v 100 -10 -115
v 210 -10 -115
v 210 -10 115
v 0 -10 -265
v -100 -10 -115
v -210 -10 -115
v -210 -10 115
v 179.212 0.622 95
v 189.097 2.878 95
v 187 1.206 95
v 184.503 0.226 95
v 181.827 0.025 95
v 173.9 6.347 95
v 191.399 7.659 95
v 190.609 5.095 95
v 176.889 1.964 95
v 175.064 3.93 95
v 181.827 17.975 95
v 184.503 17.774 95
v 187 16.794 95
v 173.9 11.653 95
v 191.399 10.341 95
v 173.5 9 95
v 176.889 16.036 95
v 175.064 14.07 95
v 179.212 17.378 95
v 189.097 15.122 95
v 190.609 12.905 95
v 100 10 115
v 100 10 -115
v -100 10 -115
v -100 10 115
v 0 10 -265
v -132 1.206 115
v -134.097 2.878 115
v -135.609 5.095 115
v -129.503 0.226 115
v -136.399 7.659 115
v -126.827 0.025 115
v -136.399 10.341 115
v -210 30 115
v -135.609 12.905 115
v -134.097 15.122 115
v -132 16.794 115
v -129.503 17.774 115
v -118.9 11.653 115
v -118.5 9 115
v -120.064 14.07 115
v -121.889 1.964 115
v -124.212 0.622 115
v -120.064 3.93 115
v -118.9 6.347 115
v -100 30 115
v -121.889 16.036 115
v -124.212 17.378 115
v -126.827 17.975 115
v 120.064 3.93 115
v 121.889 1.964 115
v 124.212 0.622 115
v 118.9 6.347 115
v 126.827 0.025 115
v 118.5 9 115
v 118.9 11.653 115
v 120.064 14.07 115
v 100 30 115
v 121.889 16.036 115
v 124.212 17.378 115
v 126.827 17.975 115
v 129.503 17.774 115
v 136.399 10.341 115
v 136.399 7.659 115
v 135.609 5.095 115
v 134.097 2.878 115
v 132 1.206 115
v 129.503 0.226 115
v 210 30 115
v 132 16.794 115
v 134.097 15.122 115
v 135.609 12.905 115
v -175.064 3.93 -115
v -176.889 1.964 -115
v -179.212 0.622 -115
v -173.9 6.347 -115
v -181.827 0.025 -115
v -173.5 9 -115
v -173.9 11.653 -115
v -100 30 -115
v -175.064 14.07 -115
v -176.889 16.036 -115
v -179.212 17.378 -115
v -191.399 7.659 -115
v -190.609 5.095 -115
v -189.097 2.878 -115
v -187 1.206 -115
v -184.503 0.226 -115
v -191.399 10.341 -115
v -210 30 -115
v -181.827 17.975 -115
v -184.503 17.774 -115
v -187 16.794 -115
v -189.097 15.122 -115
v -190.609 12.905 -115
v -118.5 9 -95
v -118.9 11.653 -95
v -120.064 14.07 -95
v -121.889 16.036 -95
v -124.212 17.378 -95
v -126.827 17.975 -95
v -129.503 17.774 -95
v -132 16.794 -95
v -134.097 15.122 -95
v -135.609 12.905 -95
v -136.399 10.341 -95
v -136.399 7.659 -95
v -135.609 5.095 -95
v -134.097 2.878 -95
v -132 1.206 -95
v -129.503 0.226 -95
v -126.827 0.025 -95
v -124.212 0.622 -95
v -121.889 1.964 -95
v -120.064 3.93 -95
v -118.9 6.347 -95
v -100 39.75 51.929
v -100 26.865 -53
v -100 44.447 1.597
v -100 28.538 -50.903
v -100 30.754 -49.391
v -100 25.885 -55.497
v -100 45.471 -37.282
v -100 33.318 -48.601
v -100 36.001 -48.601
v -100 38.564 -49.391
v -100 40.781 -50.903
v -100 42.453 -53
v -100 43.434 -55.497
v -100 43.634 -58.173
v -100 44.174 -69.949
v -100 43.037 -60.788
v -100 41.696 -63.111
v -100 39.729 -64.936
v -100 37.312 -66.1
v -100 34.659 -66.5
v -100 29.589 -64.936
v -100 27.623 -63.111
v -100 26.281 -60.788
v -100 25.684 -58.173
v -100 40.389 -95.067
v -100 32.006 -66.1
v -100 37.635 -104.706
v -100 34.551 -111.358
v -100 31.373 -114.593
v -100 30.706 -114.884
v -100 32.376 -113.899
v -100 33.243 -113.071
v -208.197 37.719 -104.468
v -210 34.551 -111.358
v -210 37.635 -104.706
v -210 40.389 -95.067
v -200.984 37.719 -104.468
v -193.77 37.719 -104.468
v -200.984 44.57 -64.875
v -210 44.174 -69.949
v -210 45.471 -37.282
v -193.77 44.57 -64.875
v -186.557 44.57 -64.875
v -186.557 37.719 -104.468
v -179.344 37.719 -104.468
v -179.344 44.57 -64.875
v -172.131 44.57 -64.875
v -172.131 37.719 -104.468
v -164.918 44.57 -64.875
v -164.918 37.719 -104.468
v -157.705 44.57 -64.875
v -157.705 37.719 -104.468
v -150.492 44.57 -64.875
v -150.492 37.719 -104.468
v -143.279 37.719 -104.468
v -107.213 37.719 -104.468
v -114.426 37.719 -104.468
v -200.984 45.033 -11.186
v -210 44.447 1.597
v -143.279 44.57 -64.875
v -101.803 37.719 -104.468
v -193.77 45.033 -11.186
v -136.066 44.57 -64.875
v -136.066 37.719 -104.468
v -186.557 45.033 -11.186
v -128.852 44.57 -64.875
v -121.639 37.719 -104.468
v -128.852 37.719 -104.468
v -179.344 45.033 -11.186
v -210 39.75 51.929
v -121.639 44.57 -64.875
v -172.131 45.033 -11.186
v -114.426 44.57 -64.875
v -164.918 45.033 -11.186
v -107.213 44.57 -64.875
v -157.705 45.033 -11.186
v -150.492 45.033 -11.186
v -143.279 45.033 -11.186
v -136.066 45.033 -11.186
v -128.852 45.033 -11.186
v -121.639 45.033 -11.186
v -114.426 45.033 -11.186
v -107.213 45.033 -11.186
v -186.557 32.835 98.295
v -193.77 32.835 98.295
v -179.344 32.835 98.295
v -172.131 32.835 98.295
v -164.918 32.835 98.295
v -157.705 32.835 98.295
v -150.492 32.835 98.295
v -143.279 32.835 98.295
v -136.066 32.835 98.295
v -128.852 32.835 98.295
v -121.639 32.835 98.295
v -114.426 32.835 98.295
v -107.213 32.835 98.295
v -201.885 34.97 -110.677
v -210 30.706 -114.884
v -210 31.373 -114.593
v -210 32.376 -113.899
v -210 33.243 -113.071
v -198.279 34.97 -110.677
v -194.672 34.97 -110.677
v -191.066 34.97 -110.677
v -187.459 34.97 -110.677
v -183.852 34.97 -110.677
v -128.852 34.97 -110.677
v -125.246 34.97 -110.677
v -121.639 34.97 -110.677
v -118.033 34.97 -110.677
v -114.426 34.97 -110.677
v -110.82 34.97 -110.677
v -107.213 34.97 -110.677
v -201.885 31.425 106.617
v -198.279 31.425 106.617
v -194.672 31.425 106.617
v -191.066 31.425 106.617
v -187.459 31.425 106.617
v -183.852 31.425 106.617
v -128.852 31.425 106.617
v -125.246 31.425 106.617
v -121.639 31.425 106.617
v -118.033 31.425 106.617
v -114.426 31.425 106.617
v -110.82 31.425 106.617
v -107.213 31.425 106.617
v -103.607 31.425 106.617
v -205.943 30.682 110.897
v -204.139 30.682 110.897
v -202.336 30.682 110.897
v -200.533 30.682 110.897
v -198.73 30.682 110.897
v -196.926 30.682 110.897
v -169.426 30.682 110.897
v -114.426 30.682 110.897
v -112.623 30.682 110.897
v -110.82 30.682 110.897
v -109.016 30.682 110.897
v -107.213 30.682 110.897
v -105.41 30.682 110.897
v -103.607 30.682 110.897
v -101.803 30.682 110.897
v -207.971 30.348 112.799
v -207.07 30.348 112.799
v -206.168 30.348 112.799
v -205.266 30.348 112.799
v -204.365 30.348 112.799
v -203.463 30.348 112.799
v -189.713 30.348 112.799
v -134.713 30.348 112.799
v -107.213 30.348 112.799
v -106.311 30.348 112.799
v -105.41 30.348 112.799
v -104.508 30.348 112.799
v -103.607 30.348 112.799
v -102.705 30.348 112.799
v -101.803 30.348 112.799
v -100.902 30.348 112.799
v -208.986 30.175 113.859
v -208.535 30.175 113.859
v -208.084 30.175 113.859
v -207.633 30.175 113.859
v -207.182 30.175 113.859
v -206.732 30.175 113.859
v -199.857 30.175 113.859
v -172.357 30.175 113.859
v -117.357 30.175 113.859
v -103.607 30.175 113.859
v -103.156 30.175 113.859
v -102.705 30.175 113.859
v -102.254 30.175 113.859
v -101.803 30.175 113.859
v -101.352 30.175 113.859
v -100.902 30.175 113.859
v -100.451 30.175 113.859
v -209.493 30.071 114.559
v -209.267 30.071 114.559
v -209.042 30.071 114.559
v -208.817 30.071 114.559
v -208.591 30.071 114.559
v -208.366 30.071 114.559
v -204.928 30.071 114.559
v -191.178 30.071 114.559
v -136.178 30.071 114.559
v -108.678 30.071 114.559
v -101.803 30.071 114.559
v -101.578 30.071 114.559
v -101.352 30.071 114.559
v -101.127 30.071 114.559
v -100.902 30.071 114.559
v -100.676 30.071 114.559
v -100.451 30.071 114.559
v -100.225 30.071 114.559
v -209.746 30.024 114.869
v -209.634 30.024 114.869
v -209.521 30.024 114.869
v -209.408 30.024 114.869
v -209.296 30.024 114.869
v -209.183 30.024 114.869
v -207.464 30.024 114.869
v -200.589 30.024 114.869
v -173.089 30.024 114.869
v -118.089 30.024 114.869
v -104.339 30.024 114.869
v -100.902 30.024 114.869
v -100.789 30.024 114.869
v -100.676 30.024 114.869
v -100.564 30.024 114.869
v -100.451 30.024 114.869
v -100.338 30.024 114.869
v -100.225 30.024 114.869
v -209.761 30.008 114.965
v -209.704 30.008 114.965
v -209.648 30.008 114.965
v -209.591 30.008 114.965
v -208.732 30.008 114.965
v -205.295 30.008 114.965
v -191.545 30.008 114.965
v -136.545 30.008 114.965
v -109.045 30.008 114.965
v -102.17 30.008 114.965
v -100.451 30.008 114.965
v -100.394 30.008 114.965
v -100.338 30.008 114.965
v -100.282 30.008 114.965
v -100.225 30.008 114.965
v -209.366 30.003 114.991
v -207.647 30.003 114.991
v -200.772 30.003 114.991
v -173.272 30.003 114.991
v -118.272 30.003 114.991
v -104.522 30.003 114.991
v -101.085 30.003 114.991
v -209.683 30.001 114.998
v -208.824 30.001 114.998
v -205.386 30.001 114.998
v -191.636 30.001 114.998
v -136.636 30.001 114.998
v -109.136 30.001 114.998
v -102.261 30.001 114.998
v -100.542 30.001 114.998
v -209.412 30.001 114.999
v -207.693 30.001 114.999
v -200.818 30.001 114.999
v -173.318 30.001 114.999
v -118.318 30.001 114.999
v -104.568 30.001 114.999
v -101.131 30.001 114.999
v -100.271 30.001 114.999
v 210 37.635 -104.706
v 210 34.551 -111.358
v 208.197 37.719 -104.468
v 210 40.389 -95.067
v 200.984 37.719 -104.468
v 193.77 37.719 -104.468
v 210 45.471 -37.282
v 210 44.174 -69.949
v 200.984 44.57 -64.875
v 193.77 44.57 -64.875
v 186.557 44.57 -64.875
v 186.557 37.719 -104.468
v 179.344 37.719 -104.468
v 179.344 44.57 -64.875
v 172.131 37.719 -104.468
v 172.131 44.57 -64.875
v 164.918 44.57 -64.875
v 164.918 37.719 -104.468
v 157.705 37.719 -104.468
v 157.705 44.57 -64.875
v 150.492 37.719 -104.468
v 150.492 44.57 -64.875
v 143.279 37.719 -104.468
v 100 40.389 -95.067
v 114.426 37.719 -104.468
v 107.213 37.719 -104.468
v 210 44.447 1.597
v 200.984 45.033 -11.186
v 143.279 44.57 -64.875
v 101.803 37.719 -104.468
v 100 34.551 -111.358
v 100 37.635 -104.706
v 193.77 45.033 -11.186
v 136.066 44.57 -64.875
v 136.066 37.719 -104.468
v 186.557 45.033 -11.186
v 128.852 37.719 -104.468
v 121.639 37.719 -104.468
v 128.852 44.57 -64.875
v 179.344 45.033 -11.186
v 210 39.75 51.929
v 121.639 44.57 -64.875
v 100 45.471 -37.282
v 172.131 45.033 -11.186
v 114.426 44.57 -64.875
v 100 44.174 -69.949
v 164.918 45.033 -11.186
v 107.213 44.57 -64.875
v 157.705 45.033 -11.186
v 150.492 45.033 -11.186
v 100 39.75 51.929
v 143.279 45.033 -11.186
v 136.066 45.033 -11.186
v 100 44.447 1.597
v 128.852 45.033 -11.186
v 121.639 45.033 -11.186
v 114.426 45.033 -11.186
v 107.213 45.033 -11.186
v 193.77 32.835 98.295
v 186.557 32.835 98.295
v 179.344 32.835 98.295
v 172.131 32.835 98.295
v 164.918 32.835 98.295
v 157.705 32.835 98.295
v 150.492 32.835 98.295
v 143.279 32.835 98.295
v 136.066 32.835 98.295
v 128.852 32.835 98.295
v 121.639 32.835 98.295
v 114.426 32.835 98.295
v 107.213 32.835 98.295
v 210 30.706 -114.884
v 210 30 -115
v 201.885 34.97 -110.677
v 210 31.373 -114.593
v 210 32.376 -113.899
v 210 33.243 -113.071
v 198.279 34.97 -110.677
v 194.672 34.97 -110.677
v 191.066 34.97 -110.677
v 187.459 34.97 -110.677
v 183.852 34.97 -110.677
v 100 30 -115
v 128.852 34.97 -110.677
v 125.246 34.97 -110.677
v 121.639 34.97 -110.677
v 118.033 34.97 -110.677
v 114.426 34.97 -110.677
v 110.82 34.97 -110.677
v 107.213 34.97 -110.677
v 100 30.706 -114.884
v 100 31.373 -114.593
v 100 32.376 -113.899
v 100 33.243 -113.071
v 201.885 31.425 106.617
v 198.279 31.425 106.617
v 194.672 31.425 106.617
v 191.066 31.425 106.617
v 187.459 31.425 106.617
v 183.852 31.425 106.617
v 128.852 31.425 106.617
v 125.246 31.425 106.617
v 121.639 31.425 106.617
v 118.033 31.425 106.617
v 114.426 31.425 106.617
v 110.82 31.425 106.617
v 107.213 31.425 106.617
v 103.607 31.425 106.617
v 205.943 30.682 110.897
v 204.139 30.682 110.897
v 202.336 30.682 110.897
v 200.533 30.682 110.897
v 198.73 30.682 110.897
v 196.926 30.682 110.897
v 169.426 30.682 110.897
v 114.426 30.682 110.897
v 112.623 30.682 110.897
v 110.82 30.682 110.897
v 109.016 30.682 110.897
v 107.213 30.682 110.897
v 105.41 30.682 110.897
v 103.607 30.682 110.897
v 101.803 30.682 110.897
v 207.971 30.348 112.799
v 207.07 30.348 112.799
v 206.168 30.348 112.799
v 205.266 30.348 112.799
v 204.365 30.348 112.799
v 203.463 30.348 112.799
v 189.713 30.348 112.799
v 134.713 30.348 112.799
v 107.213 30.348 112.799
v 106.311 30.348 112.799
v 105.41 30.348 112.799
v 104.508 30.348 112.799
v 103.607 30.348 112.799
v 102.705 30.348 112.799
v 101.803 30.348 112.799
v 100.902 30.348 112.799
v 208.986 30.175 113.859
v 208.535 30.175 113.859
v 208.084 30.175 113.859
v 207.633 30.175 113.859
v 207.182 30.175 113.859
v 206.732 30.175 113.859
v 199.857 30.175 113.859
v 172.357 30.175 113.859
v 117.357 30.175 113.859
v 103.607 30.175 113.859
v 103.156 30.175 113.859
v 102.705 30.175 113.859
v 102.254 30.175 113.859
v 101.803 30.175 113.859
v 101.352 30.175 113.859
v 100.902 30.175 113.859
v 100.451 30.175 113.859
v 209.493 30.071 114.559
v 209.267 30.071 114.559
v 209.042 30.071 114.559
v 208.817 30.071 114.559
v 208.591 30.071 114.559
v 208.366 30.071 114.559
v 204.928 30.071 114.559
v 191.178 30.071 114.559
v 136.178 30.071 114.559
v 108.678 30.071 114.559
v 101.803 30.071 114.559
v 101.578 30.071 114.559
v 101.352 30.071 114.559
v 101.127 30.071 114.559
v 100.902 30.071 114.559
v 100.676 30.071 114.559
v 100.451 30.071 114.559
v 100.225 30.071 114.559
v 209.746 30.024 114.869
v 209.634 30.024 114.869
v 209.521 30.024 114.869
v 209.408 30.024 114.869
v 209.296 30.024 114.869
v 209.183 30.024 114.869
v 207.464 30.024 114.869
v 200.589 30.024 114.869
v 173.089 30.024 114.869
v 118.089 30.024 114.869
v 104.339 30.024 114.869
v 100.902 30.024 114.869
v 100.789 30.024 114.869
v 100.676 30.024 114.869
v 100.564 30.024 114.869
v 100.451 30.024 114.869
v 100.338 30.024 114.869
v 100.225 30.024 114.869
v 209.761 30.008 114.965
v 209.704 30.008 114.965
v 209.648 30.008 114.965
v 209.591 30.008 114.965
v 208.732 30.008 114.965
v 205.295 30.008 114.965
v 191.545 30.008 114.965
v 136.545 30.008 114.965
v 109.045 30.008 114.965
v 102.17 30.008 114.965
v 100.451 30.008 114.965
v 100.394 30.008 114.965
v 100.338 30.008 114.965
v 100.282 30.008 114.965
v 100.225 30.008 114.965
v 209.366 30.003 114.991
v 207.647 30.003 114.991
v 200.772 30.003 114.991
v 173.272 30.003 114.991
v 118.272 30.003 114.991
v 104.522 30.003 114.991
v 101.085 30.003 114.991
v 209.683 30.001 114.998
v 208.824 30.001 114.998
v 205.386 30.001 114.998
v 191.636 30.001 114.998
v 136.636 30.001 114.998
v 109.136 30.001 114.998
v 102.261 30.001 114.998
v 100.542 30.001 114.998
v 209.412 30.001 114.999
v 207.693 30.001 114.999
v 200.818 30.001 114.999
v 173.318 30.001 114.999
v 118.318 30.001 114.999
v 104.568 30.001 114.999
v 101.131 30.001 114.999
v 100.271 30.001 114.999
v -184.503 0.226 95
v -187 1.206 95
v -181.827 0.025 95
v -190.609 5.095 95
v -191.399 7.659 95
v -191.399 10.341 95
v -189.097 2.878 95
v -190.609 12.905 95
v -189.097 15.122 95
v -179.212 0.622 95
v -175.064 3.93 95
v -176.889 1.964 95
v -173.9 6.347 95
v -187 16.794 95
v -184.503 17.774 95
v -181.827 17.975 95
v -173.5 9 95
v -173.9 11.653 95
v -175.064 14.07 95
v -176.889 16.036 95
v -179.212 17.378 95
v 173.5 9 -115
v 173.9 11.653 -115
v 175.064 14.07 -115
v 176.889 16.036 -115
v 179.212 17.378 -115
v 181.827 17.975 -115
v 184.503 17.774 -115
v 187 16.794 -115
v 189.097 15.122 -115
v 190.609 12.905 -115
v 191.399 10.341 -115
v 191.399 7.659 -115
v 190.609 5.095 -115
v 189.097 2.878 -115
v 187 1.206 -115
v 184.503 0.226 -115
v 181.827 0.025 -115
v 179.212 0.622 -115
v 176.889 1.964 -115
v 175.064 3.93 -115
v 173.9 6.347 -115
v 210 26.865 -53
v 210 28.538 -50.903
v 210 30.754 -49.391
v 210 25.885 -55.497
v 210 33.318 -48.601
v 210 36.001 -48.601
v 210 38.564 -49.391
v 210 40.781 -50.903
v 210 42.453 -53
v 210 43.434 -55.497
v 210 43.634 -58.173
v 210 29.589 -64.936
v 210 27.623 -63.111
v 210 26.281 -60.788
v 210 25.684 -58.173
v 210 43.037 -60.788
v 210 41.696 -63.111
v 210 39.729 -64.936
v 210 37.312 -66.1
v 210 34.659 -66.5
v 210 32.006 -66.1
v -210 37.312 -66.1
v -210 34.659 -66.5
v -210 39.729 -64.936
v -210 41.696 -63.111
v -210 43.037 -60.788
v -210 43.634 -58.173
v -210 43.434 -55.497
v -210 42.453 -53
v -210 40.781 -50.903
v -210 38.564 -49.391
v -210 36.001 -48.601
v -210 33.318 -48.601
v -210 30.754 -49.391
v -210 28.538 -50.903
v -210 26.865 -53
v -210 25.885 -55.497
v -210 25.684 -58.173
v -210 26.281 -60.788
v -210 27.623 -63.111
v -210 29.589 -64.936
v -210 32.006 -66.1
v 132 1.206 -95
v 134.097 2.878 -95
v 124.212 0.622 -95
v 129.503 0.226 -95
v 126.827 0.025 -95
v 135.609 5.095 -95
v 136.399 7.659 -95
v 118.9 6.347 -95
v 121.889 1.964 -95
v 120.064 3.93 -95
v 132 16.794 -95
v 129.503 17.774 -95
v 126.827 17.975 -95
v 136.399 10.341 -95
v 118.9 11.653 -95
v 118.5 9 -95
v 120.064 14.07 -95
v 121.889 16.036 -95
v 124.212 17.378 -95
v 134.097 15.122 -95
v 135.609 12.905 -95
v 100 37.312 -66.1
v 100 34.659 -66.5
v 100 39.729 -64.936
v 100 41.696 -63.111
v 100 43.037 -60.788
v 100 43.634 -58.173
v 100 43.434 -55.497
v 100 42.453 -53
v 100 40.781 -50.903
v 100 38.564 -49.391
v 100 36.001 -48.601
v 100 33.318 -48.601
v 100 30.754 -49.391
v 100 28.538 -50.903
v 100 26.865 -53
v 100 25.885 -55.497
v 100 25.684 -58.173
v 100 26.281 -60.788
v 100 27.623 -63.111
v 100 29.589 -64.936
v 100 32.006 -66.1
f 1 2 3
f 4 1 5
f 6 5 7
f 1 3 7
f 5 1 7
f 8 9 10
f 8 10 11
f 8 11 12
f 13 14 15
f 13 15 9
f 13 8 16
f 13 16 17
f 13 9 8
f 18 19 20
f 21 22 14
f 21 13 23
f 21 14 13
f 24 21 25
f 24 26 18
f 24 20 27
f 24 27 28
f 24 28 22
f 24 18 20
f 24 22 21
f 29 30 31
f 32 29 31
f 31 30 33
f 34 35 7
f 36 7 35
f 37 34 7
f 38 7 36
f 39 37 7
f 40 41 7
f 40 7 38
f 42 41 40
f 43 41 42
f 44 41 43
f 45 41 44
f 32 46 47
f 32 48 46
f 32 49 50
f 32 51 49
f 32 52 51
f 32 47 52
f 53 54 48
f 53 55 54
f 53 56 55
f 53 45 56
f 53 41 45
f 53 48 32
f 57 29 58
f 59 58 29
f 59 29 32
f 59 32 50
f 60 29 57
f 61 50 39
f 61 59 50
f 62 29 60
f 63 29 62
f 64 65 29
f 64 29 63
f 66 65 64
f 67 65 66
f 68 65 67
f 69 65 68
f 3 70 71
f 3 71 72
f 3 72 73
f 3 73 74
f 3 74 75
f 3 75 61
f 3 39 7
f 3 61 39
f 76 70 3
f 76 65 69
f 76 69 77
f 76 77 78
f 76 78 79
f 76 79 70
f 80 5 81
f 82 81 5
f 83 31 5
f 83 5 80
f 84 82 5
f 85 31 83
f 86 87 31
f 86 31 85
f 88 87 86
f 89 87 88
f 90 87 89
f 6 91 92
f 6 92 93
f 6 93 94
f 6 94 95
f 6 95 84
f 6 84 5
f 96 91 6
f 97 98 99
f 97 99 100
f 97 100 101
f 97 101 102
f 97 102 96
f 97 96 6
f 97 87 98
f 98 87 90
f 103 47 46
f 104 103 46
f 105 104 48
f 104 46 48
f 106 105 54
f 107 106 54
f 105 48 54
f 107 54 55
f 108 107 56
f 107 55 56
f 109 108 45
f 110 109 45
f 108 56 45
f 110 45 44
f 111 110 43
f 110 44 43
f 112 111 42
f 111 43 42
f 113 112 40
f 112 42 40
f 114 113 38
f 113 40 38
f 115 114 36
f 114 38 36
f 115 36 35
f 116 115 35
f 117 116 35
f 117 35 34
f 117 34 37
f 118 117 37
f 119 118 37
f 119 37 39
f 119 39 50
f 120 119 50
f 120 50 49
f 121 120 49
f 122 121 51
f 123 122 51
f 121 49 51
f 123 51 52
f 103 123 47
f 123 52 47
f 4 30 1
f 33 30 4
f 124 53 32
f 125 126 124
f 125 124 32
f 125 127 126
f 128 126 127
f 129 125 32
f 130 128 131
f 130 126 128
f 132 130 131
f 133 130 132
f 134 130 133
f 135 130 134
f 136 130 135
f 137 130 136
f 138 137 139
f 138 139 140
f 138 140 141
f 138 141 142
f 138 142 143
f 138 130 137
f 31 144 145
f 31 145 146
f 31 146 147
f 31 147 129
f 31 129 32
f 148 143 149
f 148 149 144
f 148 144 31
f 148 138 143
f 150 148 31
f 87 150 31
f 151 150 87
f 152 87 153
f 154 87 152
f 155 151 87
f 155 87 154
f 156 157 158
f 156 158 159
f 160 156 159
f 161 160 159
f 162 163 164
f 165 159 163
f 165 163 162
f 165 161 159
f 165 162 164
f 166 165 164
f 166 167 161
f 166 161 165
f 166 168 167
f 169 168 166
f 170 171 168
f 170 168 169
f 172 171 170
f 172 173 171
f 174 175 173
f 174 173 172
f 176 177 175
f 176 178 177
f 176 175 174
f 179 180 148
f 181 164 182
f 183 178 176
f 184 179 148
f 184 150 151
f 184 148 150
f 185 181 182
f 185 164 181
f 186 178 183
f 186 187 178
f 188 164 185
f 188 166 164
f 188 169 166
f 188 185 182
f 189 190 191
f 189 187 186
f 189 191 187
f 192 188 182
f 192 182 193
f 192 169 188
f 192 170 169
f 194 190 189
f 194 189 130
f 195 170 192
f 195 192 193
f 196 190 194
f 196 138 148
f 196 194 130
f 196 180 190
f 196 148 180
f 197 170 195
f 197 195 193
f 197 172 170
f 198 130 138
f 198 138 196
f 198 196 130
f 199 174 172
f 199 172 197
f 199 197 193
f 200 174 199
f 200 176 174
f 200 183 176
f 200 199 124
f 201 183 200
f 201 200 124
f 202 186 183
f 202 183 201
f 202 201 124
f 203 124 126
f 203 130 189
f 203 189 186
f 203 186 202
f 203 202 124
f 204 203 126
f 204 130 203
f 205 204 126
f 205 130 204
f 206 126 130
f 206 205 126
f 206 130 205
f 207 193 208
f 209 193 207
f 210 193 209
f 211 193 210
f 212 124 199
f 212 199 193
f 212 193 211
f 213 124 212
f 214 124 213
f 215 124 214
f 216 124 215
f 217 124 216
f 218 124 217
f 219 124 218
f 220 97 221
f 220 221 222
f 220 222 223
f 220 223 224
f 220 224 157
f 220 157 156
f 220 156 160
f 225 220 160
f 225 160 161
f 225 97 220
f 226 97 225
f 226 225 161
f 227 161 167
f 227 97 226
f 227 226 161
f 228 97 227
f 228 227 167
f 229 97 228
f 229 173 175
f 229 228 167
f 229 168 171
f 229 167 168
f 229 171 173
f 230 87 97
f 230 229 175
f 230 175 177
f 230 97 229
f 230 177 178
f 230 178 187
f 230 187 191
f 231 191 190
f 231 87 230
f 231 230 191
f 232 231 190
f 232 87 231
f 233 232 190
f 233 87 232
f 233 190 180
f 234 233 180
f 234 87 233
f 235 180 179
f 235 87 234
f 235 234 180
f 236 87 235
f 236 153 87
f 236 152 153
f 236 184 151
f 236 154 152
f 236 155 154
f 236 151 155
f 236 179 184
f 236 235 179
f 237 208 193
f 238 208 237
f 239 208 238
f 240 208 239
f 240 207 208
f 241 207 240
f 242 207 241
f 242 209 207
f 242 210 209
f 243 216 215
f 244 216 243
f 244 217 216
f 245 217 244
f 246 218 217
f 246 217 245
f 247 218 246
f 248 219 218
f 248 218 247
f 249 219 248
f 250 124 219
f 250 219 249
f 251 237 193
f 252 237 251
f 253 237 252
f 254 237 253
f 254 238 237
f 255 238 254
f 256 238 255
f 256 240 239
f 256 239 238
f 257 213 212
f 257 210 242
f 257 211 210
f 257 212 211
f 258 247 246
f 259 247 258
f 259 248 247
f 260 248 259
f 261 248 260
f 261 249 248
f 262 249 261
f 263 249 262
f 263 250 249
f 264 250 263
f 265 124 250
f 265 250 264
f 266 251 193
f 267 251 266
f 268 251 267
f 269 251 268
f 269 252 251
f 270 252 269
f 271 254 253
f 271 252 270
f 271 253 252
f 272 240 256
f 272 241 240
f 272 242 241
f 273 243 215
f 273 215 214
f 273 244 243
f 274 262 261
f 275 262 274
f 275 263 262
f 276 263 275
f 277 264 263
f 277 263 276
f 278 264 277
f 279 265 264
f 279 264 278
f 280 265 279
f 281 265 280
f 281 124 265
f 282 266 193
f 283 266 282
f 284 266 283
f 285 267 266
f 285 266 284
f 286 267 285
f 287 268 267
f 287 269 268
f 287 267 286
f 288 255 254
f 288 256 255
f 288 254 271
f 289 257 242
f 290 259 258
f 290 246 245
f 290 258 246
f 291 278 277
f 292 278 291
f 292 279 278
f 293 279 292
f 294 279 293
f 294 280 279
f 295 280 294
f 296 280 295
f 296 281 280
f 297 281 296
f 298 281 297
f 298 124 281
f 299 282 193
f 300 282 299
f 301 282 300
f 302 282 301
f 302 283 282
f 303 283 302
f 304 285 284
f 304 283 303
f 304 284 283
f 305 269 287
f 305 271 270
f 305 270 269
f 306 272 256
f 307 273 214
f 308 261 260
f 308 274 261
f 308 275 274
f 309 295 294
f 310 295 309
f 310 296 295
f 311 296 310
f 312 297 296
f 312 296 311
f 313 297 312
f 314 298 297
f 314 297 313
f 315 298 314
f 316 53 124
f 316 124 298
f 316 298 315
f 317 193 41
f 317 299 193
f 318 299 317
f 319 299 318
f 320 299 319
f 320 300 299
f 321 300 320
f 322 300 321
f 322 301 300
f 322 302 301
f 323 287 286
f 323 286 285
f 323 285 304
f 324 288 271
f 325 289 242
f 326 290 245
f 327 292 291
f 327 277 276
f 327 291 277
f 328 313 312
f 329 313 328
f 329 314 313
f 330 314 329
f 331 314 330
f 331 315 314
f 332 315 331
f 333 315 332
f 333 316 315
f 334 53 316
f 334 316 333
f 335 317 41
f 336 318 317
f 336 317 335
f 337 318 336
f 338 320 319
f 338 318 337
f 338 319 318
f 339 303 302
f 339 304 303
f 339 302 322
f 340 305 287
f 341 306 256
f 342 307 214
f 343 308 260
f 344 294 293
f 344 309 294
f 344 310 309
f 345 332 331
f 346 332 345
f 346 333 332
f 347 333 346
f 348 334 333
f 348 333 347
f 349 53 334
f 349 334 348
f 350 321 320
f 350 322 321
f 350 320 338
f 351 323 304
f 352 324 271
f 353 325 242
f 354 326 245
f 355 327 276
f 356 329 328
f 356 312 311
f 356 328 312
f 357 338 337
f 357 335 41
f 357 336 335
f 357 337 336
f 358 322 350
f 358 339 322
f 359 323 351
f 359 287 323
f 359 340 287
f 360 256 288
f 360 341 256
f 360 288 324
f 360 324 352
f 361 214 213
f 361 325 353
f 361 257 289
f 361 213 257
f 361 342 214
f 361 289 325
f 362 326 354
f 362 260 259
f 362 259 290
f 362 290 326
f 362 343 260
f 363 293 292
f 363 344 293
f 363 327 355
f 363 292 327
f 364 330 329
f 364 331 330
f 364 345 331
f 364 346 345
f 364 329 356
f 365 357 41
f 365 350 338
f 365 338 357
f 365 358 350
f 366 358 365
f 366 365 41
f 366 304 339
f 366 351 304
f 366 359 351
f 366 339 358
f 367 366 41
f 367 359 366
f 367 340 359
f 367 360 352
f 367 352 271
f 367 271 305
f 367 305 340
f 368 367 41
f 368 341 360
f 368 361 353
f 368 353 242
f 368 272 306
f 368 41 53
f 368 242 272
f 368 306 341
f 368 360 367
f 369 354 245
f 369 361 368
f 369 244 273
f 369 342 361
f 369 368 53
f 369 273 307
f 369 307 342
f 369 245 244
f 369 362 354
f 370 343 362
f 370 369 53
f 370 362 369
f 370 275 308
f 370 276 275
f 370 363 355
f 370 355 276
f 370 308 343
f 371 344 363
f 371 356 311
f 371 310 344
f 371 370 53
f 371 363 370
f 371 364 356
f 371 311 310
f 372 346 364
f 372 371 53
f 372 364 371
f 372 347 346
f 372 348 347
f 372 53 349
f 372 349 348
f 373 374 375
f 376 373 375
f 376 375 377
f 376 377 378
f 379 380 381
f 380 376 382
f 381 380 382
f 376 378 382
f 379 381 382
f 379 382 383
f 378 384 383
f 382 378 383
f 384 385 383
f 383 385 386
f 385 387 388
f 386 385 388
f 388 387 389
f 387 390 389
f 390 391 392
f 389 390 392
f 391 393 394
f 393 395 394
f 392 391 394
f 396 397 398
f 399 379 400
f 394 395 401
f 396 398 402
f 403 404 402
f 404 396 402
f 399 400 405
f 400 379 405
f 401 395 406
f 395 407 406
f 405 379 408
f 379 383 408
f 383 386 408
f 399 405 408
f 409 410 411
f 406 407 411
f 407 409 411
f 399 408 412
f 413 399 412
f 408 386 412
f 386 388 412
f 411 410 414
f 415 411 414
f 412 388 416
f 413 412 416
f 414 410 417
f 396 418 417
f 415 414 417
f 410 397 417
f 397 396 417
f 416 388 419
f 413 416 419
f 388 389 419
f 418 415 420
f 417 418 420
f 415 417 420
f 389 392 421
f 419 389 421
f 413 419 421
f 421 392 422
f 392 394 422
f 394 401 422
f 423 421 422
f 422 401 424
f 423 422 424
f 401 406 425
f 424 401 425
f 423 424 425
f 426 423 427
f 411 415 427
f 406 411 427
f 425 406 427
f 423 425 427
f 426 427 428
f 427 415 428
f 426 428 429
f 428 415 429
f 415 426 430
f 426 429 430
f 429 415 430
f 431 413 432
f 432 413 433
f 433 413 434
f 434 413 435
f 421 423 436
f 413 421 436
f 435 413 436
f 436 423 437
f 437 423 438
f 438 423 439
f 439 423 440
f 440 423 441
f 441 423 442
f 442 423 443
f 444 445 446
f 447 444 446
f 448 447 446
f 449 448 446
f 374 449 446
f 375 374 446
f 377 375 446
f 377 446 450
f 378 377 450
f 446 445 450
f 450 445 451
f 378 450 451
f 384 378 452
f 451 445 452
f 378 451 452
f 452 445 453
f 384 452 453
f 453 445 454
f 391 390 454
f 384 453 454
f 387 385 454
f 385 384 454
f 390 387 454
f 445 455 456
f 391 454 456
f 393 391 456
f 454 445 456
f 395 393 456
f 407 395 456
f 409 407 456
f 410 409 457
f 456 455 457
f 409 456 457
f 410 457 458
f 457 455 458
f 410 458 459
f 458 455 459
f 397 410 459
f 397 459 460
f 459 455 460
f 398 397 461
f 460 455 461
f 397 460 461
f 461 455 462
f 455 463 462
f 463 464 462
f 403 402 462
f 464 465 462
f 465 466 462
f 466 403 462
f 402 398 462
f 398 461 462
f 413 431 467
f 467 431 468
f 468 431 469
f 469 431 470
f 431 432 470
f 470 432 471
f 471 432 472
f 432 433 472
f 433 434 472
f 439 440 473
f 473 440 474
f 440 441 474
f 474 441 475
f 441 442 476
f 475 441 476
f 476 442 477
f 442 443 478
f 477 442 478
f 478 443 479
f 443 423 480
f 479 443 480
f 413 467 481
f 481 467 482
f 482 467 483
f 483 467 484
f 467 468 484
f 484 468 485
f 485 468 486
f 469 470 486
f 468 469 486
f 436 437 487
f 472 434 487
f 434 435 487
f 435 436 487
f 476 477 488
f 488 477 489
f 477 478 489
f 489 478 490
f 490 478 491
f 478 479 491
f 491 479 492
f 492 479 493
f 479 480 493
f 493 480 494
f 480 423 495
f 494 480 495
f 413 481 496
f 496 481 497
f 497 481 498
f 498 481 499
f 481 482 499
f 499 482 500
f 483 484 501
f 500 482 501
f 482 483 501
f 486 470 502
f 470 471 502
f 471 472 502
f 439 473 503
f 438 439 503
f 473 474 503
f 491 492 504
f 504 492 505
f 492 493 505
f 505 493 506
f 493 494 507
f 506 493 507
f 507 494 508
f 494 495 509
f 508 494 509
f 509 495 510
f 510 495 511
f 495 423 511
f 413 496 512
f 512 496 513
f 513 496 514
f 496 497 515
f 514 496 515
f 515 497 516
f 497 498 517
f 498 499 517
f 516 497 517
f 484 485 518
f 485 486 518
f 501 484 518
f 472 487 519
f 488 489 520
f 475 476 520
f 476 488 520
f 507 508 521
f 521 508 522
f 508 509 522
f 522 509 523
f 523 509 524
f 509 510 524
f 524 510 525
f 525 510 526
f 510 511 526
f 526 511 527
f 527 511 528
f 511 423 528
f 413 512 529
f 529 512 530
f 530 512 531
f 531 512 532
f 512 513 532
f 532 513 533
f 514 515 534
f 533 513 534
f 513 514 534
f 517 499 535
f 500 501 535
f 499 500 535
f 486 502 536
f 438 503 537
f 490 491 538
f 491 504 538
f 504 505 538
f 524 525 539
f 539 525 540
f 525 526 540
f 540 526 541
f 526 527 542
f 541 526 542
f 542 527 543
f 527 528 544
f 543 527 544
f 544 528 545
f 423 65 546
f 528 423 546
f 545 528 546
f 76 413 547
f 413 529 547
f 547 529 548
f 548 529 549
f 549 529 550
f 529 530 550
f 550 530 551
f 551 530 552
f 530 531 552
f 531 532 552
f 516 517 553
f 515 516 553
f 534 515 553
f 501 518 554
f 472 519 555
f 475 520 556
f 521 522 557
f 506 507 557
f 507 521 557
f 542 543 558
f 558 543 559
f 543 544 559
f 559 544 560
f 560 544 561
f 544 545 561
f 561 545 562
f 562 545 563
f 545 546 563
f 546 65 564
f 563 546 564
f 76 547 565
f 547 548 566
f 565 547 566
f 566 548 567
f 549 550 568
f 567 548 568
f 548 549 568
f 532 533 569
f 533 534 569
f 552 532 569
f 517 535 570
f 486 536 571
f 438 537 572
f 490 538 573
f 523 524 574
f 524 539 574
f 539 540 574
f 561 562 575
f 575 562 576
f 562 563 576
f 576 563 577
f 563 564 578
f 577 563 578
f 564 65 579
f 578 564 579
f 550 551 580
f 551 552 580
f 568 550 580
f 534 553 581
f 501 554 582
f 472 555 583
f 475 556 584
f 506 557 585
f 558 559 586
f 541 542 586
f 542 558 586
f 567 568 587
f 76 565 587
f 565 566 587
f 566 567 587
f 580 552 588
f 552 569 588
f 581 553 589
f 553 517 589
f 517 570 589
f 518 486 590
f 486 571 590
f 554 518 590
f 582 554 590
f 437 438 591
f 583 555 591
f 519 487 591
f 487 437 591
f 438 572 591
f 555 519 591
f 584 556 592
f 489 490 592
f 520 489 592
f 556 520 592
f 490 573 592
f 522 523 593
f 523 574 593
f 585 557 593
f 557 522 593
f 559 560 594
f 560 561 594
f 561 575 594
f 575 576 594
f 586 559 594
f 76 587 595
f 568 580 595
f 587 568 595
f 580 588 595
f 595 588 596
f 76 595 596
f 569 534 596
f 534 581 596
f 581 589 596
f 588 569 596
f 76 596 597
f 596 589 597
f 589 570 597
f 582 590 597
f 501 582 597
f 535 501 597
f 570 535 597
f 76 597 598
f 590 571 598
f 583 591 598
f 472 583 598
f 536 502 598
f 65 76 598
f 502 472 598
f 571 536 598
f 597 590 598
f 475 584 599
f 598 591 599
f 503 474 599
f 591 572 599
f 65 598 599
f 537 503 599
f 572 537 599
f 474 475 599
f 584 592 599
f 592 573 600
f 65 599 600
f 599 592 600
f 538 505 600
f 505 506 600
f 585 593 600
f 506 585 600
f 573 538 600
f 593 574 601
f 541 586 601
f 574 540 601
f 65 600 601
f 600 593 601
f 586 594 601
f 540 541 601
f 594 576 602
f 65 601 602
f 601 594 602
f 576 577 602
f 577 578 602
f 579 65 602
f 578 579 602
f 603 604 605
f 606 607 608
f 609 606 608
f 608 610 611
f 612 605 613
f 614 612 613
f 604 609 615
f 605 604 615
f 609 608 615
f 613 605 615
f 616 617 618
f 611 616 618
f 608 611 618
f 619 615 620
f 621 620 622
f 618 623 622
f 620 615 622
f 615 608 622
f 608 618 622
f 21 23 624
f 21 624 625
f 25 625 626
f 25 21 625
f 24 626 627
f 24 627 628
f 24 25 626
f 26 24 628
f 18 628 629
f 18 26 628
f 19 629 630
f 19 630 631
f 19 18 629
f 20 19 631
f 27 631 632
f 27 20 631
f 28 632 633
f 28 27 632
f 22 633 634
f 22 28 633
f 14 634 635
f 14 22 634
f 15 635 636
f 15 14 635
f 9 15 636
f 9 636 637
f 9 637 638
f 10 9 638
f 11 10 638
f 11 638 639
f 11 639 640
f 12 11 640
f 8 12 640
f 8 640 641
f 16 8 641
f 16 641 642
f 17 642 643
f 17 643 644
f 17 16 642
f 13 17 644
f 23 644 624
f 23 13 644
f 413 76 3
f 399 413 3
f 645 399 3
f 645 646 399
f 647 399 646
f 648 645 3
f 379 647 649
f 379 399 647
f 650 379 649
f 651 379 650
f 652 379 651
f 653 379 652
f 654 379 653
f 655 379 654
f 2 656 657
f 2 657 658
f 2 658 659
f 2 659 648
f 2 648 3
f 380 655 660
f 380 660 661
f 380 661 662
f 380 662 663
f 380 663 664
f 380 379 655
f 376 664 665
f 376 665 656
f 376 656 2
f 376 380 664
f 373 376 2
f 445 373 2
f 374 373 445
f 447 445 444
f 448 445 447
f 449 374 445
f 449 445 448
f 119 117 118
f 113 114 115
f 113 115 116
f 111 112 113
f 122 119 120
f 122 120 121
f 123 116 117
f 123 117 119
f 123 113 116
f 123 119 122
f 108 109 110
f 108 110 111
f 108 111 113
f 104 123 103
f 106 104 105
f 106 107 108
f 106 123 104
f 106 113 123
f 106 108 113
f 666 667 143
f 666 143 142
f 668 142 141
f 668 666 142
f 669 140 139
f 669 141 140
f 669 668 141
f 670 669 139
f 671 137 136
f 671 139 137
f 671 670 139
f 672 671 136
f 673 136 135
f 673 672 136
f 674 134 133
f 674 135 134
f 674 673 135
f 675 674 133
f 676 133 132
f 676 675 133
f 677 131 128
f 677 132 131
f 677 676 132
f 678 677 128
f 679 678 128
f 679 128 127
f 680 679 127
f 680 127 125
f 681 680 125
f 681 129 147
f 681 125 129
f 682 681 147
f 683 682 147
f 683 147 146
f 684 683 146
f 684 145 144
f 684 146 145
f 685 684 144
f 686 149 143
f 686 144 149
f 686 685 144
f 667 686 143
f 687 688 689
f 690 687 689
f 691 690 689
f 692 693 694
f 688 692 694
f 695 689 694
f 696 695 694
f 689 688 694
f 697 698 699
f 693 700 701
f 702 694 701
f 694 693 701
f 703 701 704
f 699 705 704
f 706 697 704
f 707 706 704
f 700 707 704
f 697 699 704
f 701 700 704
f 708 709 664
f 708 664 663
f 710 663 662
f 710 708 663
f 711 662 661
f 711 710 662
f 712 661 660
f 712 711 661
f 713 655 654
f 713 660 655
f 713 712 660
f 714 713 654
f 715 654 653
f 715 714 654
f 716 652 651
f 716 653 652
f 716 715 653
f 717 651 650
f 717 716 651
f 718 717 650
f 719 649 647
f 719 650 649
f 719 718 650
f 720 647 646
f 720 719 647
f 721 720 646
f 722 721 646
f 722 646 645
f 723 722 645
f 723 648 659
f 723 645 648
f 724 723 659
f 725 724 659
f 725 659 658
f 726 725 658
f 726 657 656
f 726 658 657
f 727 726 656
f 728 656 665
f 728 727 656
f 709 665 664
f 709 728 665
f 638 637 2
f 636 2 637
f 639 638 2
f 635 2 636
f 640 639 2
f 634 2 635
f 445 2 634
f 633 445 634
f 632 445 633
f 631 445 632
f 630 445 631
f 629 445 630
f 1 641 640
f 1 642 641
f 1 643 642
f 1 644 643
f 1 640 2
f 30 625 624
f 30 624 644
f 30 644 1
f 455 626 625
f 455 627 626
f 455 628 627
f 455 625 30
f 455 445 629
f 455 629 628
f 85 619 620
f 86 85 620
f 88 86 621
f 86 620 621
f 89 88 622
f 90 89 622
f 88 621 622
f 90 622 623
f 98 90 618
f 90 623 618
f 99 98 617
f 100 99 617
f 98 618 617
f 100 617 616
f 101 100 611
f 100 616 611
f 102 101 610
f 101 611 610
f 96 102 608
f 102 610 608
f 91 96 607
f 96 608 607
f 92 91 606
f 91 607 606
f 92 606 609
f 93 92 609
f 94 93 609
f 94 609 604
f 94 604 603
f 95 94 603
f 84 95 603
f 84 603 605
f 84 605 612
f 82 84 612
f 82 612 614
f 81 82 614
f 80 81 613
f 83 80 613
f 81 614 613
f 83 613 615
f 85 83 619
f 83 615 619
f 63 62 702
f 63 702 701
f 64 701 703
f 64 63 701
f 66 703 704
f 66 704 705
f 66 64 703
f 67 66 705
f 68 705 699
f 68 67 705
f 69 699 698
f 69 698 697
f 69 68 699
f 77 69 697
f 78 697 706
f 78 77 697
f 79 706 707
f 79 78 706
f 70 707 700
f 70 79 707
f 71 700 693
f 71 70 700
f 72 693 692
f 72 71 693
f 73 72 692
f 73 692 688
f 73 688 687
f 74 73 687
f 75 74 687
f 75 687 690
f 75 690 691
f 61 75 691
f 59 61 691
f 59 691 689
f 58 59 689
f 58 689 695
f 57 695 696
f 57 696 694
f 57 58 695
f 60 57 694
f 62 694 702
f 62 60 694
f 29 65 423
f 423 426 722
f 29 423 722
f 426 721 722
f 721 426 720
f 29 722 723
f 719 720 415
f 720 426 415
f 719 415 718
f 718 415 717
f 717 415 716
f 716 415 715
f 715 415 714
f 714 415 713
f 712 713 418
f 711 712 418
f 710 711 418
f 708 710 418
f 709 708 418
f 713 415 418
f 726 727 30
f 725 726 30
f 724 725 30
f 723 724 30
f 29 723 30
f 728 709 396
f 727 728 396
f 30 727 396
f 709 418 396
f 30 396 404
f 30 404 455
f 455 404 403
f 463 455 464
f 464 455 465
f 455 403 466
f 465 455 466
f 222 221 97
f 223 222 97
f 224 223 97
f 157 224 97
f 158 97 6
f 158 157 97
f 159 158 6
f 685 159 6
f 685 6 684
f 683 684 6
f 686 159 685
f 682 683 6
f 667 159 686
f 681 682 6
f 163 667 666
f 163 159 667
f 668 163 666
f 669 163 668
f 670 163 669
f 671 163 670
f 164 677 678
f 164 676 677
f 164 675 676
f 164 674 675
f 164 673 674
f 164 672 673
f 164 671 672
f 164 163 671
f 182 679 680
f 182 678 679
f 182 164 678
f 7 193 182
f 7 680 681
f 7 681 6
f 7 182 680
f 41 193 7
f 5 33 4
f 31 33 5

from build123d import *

# Parameters (mm, degrees)
ESTRUSIONE_ESTRUSIONE1_DEPTH  = 10
SCHIZZO4_W                    = 110
SCHIZZO4_H                    = 230
ESTRUSIONE_ESTRUSIONE2_DEPTH  = 30
ESTRUSIONE_ESTRUSIONE6_DEPTH  = 110
ESTRUSIONE_ESTRUSIONE7_DEPTH  = 110
TAGLIO_ESTRUSIONE1_DEPTH      = 411.357133016
TAGLIO_ESTRUSIONE1_DEPTH_BACK = 411.357133016
SCHIZZO12_R                   = 9
ESTRUSIONE_ESTRUSIONE8_DEPTH  = 10
SCHIZZO13_R                   = 9
TAGLIO_ESTRUSIONE2_DEPTH      = 210
TAGLIO_ESTRUSIONE3_START      = -20
SCHIZZO13_3_R                 = 9
TAGLIO_ESTRUSIONE3_DEPTH      = 210


with BuildPart() as part:
    # Schizzo3 → Estrusione-Estrusione1 (new body)
    with BuildSketch(Plane(origin=(0, 0, 0), x_dir=(1, 0, 0), z_dir=(0, 1, 0))):
        Polygon((-100, 115), (0, 265), (100, 115), (100, -115), (-100, -115), align=None)
    extrude(amount=ESTRUSIONE_ESTRUSIONE1_DEPTH)

    # Schizzo4 → Estrusione-Estrusione2 (add)
    with BuildSketch(Plane(origin=(0, 0, 0), x_dir=(1, 0, 0), z_dir=(0, 1, 0))):
        with Locations((-155, 0)):
            Rectangle(SCHIZZO4_W, SCHIZZO4_H)
    estrusione_estrusione2 = extrude(amount=ESTRUSIONE_ESTRUSIONE2_DEPTH)

    # Specchia1: Estrusione-Estrusione2 across plane
    add(estrusione_estrusione2.mirror(Plane(origin=(0, 0, 0), x_dir=(0, 0, 1), z_dir=(1, 0, 0))))

    # Schizzo7 → Estrusione-Estrusione6 (add)
    with BuildSketch(Plane(origin=(210, 0, 0), x_dir=(0, 0, -1), z_dir=(1, 0, 0))):
        Polygon((-115, 30), (-67.116126168, 36.704444838), (-28.045596082, 30), align=None)
    estrusione_estrusione6 = extrude(amount=-ESTRUSIONE_ESTRUSIONE6_DEPTH)

    # Schizzo2 → Estrusione-Estrusione7 (add)
    with BuildSketch(Plane(origin=(100, 0, 0), x_dir=(0, 0, -1), z_dir=(1, 0, 0))):
        with BuildLine():
            add(Edge.make_bspline(
                [(-115, 30), (-115.000210545, 29.992600645), (-113.422148564, 30.158475864), (-111.796644727, 30.283772029), (-107.814194843, 30.630338356), (-102.861879623, 30.987329262), (-96.305865405, 31.376231826), (-88.489318037, 31.675517587), (-79.430494503, 31.807742684), (-69.341391082, 31.683388701), (-58.419850102, 31.274503076), (-46.877369477, 30.644796944), (-34.896947284, 29.847039434), (-22.646613535, 28.937405028), (-10.282420858, 27.977069897), (2.053986621, 27.029846245), (14.24124297, 26.170492863), (26.177229823, 25.446707781), (37.774042318, 24.895496731), (48.941874013, 24.516768377), (59.573909852, 24.266890816), (69.552699105, 24.140231832), (78.754080602, 24.115655421), (87.066553377, 24.222109148), (94.380340607, 24.454254196), (100.623442659, 24.835372596), (105.733457905, 25.450246293), (109.757791111, 26.267165094), (112.584447535, 27.347686718), (114.544522218, 28.409436669), (115.019506308, 29.606391564), (114.971300063, 30.713259492), (114.252481427, 32.105291566), (112.489642477, 33.883468186), (109.692003391, 35.61309624), (105.909966736, 37.265146946), (101.131610144, 38.854984679), (95.405801052, 40.36655429), (88.783353126, 41.751140678), (81.322054125, 42.956355889), (73.073722079, 43.933595569), (64.094685163, 44.671576526), (54.449786097, 45.162759351), (44.224155903, 45.437556505), (33.519437101, 45.505243934), (22.451785091, 45.379017652), (11.14328681, 45.063940096), (-0.28571179, 44.551548305), (-11.723358771, 43.840961212), (-23.065724405, 42.92819664), (-34.215267516, 41.845440169), (-45.069232514, 40.620473007), (-55.523547672, 39.302812034), (-65.469499205, 37.938342947), (-74.795963084, 36.558195732), (-83.315166316, 35.270519644), (-91.058717697, 33.948165881), (-97.854142359, 32.926071265), (-103.726595065, 31.930242691), (-108.212226347, 31.145720718), (-111.912932633, 30.508420978), (-113.462111319, 30.226412439), (-114.999791168, 30.00733917), (-115, 30)],
                knots=[0, 0, 0, 0, 0.001588889, 0.006329218, 0.014202456, 0.025172808, 0.039173483, 0.056060631, 0.075578924, 0.097363607, 0.120926258, 0.145825281, 0.171670912, 0.198108537, 0.224790184, 0.25139058, 0.277643491, 0.30332675, 0.328257458, 0.352272548, 0.375156062, 0.396620664, 0.416422729, 0.43430442, 0.45005468, 0.463465465, 0.474478994, 0.483169222, 0.489678354, 0.494104066, 0.496910015, 0.497289785, 0.501214273, 0.50645795, 0.513356957, 0.522168632, 0.53296597, 0.545689209, 0.560220779, 0.576438923, 0.594258689, 0.613600245, 0.634342386, 0.656331109, 0.679351894, 0.703152303, 0.727478208, 0.752070739, 0.776691164, 0.801140184, 0.825214387, 0.848697424, 0.871352858, 0.892947449, 0.913230871, 0.931955467, 0.948342069, 0.963693004, 0.976235918, 0.986320059, 0.993788799, 0.998424035, 1, 1, 1, 1], degree=3))
        make_face()
    estrusione_estrusione7 = extrude(amount=ESTRUSIONE_ESTRUSIONE7_DEPTH)

    # Specchia2: Estrusione-Estrusione6, Estrusione-Estrusione7 across plane
    add(estrusione_estrusione6.mirror(Plane(origin=(0, 0, 0), x_dir=(0, 0, 1), z_dir=(1, 0, 0))))
    add(estrusione_estrusione7.mirror(Plane(origin=(0, 0, 0), x_dir=(0, 0, 1), z_dir=(1, 0, 0))))

    # Schizzo12 → Taglio-Estrusione1 (cut, two sides: drawn at the far end of the back side and taken through both)
    with BuildSketch(Plane(origin=(100, 0, 0), x_dir=(0, 0, -1), z_dir=(1, 0, 0)).offset(-TAGLIO_ESTRUSIONE1_DEPTH_BACK)):
        with Locations((57.5, 34.659164248)):
            Circle(SCHIZZO12_R)
    extrude(amount=TAGLIO_ESTRUSIONE1_DEPTH + TAGLIO_ESTRUSIONE1_DEPTH_BACK, mode=Mode.SUBTRACT)

    # Schizzo14 → Estrusione-Estrusione8 (add)
    with BuildSketch(Plane.XZ):
        Polygon((-210, 115), (210, 115), (210, -115), (100, -115), (0, -265), (-100, -115), (-210, -115), align=None)
    extrude(amount=ESTRUSIONE_ESTRUSIONE8_DEPTH)

    # Schizzo13 → Taglio-Estrusione2 (cut)
    with BuildSketch(Plane.XY.offset(115)):
        with Locations((-127.5, 9)):
            Circle(SCHIZZO13_R)
    taglio_estrusione2 = extrude(amount=-TAGLIO_ESTRUSIONE2_DEPTH, mode=Mode.SUBTRACT)

    # Schizzo13<3> → Taglio-Estrusione3 (cut)
    with BuildSketch(Plane.XY.offset(115).offset(TAGLIO_ESTRUSIONE3_START)):
        with Locations((-182.5, 9)):
            Circle(SCHIZZO13_3_R)
    taglio_estrusione3 = extrude(amount=-TAGLIO_ESTRUSIONE3_DEPTH, mode=Mode.SUBTRACT)

    # Specchia3: Taglio-Estrusione2, Taglio-Estrusione3 across plane
    add(taglio_estrusione2.mirror(Plane(origin=(0, 0, 0), x_dir=(0, 0, 1), z_dir=(1, 0, 0))), mode=Mode.SUBTRACT)
    add(taglio_estrusione3.mirror(Plane(origin=(0, 0, 0), x_dir=(0, 0, 1), z_dir=(1, 0, 0))), mode=Mode.SUBTRACT)


solid = part.part
